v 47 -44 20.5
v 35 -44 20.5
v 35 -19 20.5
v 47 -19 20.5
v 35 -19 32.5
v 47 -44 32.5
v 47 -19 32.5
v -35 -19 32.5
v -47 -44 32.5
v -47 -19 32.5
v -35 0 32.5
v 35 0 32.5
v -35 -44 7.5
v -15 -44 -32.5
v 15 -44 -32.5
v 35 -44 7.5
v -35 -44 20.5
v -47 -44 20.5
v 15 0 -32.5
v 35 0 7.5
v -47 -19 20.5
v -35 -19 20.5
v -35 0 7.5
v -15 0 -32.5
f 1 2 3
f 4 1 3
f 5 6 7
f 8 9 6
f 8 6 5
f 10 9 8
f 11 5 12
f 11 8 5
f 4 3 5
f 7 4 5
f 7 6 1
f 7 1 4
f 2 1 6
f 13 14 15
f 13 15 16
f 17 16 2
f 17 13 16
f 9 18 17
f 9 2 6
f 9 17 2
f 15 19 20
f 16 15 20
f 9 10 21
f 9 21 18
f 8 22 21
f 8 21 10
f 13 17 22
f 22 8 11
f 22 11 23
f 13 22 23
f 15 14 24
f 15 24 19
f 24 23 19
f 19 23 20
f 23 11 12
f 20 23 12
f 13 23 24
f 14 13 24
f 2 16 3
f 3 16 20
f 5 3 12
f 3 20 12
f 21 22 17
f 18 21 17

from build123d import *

# Parameters (mm, degrees)
F1_DEPTH = 44
F2_W     = 25
F2_H     = 12
F3_DEPTH = 12
F4_W     = 25
F4_H     = 12
F5_DEPTH = 12


with BuildPart() as f1:
    # F0 (on Front) → F1 (new body)
    with BuildSketch(Plane.XZ):
        Polygon((-35, 7.5), (-15, -32.5), (15, -32.5), (35, 7.5), (35, 32.5), (-35, 32.5), align=None)
    extrude(amount=F1_DEPTH)

    # F2 (on face) → F3 (join)
    with BuildSketch(Plane(origin=(-35, 0, 0), x_dir=(0, -1, 0), z_dir=(-1, 0, 0))):
        with Locations((31.5, 26.5)):
            Rectangle(F2_W, F2_H)
    extrude(amount=F3_DEPTH)

    # F4 (on face) → F5 (join)
    with BuildSketch(Plane.YZ.offset(35)):
        with Locations((-31.5, 26.5)):
            Rectangle(F4_W, F4_H)
    extrude(amount=F5_DEPTH)


solid = f1.part
